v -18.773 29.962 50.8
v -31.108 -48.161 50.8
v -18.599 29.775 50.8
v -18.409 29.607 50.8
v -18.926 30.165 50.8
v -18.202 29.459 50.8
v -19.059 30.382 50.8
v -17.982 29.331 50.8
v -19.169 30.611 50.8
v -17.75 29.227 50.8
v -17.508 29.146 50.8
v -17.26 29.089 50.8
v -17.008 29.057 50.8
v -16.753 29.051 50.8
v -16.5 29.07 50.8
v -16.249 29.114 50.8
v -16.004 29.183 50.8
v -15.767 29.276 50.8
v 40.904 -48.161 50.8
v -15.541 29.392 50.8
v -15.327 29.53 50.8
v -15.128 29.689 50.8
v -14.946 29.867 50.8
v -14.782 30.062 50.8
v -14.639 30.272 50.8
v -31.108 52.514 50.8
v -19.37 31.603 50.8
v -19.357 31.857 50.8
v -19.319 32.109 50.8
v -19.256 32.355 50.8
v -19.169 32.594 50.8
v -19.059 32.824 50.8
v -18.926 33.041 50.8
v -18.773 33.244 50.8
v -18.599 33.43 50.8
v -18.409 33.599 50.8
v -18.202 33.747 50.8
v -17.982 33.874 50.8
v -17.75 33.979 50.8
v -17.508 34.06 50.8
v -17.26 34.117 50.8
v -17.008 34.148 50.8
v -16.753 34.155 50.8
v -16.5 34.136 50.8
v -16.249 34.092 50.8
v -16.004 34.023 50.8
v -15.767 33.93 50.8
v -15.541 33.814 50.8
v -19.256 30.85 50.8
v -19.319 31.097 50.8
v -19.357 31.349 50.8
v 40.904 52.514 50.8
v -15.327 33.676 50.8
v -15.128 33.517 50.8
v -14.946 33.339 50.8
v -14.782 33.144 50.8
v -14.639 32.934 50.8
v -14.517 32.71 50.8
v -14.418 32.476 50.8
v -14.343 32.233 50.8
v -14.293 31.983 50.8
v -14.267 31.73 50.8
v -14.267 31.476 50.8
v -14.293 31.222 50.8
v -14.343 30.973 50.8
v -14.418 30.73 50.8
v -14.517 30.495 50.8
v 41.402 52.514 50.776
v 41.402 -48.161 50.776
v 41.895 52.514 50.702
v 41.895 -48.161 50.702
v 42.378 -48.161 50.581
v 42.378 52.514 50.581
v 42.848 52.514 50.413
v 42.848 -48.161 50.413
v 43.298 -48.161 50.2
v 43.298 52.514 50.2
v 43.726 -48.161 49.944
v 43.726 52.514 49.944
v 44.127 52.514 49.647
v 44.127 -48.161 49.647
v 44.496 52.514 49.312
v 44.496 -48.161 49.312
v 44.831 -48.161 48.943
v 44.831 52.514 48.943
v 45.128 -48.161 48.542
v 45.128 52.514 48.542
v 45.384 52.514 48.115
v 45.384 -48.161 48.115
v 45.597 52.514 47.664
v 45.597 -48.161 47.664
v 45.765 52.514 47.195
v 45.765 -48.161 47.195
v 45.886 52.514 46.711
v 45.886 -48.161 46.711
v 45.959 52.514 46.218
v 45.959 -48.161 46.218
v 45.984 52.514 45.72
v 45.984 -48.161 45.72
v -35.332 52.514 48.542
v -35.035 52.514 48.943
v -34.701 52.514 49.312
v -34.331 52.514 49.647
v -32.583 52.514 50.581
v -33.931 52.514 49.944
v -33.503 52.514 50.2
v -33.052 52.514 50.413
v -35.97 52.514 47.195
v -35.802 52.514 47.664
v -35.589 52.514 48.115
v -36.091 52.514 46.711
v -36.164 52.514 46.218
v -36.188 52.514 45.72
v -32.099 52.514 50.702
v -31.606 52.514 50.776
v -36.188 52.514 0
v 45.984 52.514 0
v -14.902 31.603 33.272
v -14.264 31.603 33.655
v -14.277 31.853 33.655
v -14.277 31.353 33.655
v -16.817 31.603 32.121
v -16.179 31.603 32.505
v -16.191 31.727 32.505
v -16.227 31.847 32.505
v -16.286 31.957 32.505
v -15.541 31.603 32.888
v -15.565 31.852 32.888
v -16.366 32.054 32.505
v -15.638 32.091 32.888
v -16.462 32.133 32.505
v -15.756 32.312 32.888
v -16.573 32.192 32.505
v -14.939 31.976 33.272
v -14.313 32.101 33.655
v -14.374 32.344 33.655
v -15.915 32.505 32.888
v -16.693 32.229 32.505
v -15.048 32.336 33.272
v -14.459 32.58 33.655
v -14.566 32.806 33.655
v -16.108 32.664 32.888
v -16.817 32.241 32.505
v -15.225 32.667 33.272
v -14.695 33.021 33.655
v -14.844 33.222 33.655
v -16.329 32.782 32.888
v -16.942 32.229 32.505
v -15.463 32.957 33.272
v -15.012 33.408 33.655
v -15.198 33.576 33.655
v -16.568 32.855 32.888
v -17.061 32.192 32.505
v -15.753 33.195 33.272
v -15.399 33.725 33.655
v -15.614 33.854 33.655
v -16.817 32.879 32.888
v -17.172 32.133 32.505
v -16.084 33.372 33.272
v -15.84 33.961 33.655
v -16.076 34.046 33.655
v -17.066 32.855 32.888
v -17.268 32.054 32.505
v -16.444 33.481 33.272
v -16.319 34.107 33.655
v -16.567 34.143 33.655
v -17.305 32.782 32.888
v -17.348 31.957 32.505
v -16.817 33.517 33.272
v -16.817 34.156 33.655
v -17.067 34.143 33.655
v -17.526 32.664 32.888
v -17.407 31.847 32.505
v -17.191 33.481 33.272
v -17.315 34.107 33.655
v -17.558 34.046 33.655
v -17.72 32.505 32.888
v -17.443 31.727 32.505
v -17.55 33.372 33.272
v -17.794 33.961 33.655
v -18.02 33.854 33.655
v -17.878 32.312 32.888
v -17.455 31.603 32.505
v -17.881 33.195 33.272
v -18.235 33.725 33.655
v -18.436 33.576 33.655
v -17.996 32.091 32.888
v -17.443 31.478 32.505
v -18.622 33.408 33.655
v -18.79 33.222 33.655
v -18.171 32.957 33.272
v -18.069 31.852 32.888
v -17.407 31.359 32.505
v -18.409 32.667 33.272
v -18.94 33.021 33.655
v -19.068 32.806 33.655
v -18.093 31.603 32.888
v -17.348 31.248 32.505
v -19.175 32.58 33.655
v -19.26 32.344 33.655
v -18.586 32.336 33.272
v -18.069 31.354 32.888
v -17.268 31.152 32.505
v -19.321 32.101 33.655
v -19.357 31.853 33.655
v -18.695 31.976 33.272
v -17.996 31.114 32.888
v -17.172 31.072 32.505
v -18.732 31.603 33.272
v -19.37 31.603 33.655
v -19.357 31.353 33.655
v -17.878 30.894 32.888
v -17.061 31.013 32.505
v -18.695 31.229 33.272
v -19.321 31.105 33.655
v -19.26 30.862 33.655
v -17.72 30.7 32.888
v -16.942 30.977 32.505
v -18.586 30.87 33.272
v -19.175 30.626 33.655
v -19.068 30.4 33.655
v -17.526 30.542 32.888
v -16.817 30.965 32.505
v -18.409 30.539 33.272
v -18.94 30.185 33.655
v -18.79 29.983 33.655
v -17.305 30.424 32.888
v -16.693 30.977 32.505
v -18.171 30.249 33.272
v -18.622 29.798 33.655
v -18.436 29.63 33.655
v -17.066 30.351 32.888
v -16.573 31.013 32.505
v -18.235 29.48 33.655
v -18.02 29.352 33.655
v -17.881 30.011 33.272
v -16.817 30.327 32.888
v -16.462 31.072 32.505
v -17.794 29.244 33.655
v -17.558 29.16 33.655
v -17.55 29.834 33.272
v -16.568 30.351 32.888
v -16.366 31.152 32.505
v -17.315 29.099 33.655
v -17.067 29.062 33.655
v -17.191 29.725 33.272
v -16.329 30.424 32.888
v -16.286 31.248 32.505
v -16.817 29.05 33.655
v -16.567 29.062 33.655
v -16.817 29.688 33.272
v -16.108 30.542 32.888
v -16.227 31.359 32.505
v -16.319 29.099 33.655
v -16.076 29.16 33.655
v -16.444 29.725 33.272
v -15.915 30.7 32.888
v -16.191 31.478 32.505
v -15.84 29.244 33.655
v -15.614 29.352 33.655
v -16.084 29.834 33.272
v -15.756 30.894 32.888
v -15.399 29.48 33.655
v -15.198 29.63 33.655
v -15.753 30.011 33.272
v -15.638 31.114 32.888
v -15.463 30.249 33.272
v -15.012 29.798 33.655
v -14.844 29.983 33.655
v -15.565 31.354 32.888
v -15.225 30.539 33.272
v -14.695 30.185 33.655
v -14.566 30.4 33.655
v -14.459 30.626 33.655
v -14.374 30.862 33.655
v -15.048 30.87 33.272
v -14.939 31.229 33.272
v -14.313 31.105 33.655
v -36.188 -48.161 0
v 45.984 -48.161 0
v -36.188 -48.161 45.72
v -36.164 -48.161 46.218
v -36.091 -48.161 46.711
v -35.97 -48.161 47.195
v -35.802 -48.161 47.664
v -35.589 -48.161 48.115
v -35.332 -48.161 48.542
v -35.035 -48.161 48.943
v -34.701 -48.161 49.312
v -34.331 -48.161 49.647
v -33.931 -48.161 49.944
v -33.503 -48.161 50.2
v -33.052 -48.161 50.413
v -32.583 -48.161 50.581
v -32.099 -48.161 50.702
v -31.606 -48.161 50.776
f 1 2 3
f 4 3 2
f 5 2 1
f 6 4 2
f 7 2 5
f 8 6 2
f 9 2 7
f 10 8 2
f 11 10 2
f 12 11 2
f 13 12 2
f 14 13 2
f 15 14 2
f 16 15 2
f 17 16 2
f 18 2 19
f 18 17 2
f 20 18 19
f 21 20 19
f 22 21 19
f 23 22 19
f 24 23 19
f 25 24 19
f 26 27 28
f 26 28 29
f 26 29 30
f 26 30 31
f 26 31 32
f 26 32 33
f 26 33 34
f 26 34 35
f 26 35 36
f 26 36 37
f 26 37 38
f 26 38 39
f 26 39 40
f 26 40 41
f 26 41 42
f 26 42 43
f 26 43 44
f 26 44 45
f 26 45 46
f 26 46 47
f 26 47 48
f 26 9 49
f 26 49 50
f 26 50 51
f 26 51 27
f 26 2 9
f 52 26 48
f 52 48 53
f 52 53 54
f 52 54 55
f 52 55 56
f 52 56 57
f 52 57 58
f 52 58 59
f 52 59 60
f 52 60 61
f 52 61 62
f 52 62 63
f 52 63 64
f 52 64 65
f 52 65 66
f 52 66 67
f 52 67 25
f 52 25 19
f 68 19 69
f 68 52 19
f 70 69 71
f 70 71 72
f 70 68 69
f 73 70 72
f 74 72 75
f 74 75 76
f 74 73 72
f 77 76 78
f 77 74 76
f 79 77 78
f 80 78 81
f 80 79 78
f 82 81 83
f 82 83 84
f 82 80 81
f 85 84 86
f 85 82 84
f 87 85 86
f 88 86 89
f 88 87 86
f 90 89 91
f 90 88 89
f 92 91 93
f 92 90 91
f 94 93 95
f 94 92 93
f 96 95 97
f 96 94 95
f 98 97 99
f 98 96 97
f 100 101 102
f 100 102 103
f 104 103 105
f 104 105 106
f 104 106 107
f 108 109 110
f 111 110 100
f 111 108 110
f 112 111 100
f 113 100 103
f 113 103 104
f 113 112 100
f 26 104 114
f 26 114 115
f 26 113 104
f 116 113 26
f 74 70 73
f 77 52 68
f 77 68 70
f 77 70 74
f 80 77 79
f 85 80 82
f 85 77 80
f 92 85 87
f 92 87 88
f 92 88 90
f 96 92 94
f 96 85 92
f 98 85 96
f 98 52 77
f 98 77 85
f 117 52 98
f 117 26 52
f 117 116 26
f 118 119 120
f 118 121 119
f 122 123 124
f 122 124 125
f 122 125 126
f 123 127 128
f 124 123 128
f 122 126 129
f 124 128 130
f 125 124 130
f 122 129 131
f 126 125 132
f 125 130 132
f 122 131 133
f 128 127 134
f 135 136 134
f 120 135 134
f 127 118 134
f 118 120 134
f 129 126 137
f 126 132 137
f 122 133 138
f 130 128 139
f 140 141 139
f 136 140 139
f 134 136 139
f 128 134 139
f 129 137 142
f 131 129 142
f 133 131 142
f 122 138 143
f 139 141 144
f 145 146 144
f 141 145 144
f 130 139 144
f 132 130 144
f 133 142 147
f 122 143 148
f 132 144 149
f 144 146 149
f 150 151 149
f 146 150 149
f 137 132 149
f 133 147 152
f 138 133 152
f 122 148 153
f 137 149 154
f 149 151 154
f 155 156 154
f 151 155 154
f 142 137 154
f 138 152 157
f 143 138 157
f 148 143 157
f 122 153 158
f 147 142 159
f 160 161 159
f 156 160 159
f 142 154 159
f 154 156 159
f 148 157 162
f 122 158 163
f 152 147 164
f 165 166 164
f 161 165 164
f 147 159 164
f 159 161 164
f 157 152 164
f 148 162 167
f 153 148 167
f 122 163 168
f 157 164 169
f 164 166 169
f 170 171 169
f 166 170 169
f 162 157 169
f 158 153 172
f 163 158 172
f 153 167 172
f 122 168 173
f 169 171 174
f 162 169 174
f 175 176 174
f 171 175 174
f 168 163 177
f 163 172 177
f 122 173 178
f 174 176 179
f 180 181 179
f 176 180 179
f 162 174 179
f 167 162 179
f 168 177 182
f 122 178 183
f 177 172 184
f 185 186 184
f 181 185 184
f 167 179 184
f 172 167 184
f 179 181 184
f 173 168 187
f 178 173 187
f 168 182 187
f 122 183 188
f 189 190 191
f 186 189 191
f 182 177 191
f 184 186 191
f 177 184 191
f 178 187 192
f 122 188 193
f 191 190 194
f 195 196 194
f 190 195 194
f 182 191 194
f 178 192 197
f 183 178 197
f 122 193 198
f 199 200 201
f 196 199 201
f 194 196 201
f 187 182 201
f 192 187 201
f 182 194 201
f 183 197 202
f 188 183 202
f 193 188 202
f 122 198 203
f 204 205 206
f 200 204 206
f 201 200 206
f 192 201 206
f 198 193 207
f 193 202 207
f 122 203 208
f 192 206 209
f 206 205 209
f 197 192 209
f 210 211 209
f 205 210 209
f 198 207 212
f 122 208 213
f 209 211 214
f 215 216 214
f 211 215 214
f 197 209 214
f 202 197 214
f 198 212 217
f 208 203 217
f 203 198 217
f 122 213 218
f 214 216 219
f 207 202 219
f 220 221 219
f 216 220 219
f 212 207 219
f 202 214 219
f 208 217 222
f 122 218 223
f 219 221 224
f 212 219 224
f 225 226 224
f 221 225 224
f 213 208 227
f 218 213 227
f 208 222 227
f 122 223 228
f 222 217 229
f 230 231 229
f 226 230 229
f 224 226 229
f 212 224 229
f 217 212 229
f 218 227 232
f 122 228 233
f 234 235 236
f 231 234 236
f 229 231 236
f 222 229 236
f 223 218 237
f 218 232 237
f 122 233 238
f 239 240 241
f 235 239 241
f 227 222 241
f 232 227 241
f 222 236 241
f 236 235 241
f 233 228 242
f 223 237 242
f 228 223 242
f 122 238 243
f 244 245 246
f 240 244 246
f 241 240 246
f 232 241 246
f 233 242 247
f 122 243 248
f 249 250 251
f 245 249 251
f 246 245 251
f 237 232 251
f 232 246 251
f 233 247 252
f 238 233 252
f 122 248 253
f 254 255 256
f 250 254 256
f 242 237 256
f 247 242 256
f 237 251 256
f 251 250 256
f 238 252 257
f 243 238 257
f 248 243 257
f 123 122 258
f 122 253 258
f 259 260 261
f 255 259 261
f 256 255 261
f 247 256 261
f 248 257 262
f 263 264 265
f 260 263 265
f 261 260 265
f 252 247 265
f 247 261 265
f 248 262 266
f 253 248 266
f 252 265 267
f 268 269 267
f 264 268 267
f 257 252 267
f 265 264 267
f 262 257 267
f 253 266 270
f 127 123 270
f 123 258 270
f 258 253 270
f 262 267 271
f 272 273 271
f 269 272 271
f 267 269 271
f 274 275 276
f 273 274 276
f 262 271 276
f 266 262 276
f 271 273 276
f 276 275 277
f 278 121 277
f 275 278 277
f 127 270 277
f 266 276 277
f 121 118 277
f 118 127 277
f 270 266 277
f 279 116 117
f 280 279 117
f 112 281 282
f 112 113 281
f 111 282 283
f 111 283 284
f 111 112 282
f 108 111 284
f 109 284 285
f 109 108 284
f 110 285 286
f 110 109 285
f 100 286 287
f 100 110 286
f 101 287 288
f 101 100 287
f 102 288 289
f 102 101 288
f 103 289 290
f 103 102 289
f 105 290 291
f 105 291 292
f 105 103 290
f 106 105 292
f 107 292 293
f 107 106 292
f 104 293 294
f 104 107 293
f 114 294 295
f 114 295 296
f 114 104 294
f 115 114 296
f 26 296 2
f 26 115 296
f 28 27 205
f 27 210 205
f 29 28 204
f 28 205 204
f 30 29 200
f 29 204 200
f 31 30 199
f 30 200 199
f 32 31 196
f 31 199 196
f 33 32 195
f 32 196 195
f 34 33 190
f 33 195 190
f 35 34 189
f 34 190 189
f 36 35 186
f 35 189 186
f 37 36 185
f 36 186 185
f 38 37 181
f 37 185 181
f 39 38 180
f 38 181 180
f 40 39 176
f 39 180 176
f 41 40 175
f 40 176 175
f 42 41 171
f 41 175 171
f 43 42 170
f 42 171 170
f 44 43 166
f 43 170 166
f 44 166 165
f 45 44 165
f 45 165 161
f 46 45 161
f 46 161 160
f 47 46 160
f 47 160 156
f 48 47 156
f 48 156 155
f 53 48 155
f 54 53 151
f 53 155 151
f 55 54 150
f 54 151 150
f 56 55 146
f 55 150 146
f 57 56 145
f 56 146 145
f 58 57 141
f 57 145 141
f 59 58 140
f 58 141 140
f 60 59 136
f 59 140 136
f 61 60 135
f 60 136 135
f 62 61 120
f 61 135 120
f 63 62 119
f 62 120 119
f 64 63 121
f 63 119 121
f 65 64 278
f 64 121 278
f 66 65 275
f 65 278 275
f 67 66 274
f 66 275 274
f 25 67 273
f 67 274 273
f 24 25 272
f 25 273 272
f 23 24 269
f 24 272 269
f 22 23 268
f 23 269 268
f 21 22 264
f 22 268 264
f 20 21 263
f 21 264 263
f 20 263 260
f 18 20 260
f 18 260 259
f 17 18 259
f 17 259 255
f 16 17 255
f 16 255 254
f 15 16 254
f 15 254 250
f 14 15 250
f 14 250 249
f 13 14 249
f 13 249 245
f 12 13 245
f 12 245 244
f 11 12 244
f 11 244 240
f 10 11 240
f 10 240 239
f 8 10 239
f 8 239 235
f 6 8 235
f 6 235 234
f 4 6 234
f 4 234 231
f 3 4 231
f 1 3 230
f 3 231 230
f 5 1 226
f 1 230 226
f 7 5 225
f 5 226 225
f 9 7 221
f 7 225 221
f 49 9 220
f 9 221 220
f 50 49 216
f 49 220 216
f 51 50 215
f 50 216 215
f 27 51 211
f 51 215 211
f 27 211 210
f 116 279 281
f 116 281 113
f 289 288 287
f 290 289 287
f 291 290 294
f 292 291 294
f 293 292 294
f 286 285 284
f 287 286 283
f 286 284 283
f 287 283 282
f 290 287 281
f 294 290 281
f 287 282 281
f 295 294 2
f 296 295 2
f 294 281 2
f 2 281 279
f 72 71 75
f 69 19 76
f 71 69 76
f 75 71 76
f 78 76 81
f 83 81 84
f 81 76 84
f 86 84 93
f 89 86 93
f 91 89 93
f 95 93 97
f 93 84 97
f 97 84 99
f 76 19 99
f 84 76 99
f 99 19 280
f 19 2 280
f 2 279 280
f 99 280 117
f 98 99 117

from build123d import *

# Parameters (mm, degrees)
F0_W     = 82.1722075343
F0_H     = 100.6745547056
F1_DEPTH = 50.8
F3_D     = 5.1054
F3_DEPTH = 17.145
F3_TIP   = 1.5338169022
F4_R     = 5.08


with BuildPart() as f1:
    # F0 (on Top) → F1 (new body)
    with BuildSketch(Plane.XY):
        with Locations((4.8976801336, 2.1767504513)):
            Rectangle(F0_W, F0_H)
    extrude(amount=F1_DEPTH)

    # F3
    with Locations(Plane.XY.offset(50.8)):
        with Locations((-16.8170183897, 31.6028743982)):
            Hole(F3_D / 2, depth=F3_DEPTH)
            with Locations((0, 0, -(F3_DEPTH + F3_TIP / 2))):  # 118° drill point
                Cone(0, F3_D / 2, F3_TIP, mode=Mode.SUBTRACT)

    # F4
    f4_edges = [f1.edges().sort_by_distance(p)[0] for p in [
        (45.983784, 2.17675, 50.8),
        (-36.188424, 2.17675, 50.8),
    ]]
    fillet(f4_edges, radius=F4_R)


solid = f1.part
